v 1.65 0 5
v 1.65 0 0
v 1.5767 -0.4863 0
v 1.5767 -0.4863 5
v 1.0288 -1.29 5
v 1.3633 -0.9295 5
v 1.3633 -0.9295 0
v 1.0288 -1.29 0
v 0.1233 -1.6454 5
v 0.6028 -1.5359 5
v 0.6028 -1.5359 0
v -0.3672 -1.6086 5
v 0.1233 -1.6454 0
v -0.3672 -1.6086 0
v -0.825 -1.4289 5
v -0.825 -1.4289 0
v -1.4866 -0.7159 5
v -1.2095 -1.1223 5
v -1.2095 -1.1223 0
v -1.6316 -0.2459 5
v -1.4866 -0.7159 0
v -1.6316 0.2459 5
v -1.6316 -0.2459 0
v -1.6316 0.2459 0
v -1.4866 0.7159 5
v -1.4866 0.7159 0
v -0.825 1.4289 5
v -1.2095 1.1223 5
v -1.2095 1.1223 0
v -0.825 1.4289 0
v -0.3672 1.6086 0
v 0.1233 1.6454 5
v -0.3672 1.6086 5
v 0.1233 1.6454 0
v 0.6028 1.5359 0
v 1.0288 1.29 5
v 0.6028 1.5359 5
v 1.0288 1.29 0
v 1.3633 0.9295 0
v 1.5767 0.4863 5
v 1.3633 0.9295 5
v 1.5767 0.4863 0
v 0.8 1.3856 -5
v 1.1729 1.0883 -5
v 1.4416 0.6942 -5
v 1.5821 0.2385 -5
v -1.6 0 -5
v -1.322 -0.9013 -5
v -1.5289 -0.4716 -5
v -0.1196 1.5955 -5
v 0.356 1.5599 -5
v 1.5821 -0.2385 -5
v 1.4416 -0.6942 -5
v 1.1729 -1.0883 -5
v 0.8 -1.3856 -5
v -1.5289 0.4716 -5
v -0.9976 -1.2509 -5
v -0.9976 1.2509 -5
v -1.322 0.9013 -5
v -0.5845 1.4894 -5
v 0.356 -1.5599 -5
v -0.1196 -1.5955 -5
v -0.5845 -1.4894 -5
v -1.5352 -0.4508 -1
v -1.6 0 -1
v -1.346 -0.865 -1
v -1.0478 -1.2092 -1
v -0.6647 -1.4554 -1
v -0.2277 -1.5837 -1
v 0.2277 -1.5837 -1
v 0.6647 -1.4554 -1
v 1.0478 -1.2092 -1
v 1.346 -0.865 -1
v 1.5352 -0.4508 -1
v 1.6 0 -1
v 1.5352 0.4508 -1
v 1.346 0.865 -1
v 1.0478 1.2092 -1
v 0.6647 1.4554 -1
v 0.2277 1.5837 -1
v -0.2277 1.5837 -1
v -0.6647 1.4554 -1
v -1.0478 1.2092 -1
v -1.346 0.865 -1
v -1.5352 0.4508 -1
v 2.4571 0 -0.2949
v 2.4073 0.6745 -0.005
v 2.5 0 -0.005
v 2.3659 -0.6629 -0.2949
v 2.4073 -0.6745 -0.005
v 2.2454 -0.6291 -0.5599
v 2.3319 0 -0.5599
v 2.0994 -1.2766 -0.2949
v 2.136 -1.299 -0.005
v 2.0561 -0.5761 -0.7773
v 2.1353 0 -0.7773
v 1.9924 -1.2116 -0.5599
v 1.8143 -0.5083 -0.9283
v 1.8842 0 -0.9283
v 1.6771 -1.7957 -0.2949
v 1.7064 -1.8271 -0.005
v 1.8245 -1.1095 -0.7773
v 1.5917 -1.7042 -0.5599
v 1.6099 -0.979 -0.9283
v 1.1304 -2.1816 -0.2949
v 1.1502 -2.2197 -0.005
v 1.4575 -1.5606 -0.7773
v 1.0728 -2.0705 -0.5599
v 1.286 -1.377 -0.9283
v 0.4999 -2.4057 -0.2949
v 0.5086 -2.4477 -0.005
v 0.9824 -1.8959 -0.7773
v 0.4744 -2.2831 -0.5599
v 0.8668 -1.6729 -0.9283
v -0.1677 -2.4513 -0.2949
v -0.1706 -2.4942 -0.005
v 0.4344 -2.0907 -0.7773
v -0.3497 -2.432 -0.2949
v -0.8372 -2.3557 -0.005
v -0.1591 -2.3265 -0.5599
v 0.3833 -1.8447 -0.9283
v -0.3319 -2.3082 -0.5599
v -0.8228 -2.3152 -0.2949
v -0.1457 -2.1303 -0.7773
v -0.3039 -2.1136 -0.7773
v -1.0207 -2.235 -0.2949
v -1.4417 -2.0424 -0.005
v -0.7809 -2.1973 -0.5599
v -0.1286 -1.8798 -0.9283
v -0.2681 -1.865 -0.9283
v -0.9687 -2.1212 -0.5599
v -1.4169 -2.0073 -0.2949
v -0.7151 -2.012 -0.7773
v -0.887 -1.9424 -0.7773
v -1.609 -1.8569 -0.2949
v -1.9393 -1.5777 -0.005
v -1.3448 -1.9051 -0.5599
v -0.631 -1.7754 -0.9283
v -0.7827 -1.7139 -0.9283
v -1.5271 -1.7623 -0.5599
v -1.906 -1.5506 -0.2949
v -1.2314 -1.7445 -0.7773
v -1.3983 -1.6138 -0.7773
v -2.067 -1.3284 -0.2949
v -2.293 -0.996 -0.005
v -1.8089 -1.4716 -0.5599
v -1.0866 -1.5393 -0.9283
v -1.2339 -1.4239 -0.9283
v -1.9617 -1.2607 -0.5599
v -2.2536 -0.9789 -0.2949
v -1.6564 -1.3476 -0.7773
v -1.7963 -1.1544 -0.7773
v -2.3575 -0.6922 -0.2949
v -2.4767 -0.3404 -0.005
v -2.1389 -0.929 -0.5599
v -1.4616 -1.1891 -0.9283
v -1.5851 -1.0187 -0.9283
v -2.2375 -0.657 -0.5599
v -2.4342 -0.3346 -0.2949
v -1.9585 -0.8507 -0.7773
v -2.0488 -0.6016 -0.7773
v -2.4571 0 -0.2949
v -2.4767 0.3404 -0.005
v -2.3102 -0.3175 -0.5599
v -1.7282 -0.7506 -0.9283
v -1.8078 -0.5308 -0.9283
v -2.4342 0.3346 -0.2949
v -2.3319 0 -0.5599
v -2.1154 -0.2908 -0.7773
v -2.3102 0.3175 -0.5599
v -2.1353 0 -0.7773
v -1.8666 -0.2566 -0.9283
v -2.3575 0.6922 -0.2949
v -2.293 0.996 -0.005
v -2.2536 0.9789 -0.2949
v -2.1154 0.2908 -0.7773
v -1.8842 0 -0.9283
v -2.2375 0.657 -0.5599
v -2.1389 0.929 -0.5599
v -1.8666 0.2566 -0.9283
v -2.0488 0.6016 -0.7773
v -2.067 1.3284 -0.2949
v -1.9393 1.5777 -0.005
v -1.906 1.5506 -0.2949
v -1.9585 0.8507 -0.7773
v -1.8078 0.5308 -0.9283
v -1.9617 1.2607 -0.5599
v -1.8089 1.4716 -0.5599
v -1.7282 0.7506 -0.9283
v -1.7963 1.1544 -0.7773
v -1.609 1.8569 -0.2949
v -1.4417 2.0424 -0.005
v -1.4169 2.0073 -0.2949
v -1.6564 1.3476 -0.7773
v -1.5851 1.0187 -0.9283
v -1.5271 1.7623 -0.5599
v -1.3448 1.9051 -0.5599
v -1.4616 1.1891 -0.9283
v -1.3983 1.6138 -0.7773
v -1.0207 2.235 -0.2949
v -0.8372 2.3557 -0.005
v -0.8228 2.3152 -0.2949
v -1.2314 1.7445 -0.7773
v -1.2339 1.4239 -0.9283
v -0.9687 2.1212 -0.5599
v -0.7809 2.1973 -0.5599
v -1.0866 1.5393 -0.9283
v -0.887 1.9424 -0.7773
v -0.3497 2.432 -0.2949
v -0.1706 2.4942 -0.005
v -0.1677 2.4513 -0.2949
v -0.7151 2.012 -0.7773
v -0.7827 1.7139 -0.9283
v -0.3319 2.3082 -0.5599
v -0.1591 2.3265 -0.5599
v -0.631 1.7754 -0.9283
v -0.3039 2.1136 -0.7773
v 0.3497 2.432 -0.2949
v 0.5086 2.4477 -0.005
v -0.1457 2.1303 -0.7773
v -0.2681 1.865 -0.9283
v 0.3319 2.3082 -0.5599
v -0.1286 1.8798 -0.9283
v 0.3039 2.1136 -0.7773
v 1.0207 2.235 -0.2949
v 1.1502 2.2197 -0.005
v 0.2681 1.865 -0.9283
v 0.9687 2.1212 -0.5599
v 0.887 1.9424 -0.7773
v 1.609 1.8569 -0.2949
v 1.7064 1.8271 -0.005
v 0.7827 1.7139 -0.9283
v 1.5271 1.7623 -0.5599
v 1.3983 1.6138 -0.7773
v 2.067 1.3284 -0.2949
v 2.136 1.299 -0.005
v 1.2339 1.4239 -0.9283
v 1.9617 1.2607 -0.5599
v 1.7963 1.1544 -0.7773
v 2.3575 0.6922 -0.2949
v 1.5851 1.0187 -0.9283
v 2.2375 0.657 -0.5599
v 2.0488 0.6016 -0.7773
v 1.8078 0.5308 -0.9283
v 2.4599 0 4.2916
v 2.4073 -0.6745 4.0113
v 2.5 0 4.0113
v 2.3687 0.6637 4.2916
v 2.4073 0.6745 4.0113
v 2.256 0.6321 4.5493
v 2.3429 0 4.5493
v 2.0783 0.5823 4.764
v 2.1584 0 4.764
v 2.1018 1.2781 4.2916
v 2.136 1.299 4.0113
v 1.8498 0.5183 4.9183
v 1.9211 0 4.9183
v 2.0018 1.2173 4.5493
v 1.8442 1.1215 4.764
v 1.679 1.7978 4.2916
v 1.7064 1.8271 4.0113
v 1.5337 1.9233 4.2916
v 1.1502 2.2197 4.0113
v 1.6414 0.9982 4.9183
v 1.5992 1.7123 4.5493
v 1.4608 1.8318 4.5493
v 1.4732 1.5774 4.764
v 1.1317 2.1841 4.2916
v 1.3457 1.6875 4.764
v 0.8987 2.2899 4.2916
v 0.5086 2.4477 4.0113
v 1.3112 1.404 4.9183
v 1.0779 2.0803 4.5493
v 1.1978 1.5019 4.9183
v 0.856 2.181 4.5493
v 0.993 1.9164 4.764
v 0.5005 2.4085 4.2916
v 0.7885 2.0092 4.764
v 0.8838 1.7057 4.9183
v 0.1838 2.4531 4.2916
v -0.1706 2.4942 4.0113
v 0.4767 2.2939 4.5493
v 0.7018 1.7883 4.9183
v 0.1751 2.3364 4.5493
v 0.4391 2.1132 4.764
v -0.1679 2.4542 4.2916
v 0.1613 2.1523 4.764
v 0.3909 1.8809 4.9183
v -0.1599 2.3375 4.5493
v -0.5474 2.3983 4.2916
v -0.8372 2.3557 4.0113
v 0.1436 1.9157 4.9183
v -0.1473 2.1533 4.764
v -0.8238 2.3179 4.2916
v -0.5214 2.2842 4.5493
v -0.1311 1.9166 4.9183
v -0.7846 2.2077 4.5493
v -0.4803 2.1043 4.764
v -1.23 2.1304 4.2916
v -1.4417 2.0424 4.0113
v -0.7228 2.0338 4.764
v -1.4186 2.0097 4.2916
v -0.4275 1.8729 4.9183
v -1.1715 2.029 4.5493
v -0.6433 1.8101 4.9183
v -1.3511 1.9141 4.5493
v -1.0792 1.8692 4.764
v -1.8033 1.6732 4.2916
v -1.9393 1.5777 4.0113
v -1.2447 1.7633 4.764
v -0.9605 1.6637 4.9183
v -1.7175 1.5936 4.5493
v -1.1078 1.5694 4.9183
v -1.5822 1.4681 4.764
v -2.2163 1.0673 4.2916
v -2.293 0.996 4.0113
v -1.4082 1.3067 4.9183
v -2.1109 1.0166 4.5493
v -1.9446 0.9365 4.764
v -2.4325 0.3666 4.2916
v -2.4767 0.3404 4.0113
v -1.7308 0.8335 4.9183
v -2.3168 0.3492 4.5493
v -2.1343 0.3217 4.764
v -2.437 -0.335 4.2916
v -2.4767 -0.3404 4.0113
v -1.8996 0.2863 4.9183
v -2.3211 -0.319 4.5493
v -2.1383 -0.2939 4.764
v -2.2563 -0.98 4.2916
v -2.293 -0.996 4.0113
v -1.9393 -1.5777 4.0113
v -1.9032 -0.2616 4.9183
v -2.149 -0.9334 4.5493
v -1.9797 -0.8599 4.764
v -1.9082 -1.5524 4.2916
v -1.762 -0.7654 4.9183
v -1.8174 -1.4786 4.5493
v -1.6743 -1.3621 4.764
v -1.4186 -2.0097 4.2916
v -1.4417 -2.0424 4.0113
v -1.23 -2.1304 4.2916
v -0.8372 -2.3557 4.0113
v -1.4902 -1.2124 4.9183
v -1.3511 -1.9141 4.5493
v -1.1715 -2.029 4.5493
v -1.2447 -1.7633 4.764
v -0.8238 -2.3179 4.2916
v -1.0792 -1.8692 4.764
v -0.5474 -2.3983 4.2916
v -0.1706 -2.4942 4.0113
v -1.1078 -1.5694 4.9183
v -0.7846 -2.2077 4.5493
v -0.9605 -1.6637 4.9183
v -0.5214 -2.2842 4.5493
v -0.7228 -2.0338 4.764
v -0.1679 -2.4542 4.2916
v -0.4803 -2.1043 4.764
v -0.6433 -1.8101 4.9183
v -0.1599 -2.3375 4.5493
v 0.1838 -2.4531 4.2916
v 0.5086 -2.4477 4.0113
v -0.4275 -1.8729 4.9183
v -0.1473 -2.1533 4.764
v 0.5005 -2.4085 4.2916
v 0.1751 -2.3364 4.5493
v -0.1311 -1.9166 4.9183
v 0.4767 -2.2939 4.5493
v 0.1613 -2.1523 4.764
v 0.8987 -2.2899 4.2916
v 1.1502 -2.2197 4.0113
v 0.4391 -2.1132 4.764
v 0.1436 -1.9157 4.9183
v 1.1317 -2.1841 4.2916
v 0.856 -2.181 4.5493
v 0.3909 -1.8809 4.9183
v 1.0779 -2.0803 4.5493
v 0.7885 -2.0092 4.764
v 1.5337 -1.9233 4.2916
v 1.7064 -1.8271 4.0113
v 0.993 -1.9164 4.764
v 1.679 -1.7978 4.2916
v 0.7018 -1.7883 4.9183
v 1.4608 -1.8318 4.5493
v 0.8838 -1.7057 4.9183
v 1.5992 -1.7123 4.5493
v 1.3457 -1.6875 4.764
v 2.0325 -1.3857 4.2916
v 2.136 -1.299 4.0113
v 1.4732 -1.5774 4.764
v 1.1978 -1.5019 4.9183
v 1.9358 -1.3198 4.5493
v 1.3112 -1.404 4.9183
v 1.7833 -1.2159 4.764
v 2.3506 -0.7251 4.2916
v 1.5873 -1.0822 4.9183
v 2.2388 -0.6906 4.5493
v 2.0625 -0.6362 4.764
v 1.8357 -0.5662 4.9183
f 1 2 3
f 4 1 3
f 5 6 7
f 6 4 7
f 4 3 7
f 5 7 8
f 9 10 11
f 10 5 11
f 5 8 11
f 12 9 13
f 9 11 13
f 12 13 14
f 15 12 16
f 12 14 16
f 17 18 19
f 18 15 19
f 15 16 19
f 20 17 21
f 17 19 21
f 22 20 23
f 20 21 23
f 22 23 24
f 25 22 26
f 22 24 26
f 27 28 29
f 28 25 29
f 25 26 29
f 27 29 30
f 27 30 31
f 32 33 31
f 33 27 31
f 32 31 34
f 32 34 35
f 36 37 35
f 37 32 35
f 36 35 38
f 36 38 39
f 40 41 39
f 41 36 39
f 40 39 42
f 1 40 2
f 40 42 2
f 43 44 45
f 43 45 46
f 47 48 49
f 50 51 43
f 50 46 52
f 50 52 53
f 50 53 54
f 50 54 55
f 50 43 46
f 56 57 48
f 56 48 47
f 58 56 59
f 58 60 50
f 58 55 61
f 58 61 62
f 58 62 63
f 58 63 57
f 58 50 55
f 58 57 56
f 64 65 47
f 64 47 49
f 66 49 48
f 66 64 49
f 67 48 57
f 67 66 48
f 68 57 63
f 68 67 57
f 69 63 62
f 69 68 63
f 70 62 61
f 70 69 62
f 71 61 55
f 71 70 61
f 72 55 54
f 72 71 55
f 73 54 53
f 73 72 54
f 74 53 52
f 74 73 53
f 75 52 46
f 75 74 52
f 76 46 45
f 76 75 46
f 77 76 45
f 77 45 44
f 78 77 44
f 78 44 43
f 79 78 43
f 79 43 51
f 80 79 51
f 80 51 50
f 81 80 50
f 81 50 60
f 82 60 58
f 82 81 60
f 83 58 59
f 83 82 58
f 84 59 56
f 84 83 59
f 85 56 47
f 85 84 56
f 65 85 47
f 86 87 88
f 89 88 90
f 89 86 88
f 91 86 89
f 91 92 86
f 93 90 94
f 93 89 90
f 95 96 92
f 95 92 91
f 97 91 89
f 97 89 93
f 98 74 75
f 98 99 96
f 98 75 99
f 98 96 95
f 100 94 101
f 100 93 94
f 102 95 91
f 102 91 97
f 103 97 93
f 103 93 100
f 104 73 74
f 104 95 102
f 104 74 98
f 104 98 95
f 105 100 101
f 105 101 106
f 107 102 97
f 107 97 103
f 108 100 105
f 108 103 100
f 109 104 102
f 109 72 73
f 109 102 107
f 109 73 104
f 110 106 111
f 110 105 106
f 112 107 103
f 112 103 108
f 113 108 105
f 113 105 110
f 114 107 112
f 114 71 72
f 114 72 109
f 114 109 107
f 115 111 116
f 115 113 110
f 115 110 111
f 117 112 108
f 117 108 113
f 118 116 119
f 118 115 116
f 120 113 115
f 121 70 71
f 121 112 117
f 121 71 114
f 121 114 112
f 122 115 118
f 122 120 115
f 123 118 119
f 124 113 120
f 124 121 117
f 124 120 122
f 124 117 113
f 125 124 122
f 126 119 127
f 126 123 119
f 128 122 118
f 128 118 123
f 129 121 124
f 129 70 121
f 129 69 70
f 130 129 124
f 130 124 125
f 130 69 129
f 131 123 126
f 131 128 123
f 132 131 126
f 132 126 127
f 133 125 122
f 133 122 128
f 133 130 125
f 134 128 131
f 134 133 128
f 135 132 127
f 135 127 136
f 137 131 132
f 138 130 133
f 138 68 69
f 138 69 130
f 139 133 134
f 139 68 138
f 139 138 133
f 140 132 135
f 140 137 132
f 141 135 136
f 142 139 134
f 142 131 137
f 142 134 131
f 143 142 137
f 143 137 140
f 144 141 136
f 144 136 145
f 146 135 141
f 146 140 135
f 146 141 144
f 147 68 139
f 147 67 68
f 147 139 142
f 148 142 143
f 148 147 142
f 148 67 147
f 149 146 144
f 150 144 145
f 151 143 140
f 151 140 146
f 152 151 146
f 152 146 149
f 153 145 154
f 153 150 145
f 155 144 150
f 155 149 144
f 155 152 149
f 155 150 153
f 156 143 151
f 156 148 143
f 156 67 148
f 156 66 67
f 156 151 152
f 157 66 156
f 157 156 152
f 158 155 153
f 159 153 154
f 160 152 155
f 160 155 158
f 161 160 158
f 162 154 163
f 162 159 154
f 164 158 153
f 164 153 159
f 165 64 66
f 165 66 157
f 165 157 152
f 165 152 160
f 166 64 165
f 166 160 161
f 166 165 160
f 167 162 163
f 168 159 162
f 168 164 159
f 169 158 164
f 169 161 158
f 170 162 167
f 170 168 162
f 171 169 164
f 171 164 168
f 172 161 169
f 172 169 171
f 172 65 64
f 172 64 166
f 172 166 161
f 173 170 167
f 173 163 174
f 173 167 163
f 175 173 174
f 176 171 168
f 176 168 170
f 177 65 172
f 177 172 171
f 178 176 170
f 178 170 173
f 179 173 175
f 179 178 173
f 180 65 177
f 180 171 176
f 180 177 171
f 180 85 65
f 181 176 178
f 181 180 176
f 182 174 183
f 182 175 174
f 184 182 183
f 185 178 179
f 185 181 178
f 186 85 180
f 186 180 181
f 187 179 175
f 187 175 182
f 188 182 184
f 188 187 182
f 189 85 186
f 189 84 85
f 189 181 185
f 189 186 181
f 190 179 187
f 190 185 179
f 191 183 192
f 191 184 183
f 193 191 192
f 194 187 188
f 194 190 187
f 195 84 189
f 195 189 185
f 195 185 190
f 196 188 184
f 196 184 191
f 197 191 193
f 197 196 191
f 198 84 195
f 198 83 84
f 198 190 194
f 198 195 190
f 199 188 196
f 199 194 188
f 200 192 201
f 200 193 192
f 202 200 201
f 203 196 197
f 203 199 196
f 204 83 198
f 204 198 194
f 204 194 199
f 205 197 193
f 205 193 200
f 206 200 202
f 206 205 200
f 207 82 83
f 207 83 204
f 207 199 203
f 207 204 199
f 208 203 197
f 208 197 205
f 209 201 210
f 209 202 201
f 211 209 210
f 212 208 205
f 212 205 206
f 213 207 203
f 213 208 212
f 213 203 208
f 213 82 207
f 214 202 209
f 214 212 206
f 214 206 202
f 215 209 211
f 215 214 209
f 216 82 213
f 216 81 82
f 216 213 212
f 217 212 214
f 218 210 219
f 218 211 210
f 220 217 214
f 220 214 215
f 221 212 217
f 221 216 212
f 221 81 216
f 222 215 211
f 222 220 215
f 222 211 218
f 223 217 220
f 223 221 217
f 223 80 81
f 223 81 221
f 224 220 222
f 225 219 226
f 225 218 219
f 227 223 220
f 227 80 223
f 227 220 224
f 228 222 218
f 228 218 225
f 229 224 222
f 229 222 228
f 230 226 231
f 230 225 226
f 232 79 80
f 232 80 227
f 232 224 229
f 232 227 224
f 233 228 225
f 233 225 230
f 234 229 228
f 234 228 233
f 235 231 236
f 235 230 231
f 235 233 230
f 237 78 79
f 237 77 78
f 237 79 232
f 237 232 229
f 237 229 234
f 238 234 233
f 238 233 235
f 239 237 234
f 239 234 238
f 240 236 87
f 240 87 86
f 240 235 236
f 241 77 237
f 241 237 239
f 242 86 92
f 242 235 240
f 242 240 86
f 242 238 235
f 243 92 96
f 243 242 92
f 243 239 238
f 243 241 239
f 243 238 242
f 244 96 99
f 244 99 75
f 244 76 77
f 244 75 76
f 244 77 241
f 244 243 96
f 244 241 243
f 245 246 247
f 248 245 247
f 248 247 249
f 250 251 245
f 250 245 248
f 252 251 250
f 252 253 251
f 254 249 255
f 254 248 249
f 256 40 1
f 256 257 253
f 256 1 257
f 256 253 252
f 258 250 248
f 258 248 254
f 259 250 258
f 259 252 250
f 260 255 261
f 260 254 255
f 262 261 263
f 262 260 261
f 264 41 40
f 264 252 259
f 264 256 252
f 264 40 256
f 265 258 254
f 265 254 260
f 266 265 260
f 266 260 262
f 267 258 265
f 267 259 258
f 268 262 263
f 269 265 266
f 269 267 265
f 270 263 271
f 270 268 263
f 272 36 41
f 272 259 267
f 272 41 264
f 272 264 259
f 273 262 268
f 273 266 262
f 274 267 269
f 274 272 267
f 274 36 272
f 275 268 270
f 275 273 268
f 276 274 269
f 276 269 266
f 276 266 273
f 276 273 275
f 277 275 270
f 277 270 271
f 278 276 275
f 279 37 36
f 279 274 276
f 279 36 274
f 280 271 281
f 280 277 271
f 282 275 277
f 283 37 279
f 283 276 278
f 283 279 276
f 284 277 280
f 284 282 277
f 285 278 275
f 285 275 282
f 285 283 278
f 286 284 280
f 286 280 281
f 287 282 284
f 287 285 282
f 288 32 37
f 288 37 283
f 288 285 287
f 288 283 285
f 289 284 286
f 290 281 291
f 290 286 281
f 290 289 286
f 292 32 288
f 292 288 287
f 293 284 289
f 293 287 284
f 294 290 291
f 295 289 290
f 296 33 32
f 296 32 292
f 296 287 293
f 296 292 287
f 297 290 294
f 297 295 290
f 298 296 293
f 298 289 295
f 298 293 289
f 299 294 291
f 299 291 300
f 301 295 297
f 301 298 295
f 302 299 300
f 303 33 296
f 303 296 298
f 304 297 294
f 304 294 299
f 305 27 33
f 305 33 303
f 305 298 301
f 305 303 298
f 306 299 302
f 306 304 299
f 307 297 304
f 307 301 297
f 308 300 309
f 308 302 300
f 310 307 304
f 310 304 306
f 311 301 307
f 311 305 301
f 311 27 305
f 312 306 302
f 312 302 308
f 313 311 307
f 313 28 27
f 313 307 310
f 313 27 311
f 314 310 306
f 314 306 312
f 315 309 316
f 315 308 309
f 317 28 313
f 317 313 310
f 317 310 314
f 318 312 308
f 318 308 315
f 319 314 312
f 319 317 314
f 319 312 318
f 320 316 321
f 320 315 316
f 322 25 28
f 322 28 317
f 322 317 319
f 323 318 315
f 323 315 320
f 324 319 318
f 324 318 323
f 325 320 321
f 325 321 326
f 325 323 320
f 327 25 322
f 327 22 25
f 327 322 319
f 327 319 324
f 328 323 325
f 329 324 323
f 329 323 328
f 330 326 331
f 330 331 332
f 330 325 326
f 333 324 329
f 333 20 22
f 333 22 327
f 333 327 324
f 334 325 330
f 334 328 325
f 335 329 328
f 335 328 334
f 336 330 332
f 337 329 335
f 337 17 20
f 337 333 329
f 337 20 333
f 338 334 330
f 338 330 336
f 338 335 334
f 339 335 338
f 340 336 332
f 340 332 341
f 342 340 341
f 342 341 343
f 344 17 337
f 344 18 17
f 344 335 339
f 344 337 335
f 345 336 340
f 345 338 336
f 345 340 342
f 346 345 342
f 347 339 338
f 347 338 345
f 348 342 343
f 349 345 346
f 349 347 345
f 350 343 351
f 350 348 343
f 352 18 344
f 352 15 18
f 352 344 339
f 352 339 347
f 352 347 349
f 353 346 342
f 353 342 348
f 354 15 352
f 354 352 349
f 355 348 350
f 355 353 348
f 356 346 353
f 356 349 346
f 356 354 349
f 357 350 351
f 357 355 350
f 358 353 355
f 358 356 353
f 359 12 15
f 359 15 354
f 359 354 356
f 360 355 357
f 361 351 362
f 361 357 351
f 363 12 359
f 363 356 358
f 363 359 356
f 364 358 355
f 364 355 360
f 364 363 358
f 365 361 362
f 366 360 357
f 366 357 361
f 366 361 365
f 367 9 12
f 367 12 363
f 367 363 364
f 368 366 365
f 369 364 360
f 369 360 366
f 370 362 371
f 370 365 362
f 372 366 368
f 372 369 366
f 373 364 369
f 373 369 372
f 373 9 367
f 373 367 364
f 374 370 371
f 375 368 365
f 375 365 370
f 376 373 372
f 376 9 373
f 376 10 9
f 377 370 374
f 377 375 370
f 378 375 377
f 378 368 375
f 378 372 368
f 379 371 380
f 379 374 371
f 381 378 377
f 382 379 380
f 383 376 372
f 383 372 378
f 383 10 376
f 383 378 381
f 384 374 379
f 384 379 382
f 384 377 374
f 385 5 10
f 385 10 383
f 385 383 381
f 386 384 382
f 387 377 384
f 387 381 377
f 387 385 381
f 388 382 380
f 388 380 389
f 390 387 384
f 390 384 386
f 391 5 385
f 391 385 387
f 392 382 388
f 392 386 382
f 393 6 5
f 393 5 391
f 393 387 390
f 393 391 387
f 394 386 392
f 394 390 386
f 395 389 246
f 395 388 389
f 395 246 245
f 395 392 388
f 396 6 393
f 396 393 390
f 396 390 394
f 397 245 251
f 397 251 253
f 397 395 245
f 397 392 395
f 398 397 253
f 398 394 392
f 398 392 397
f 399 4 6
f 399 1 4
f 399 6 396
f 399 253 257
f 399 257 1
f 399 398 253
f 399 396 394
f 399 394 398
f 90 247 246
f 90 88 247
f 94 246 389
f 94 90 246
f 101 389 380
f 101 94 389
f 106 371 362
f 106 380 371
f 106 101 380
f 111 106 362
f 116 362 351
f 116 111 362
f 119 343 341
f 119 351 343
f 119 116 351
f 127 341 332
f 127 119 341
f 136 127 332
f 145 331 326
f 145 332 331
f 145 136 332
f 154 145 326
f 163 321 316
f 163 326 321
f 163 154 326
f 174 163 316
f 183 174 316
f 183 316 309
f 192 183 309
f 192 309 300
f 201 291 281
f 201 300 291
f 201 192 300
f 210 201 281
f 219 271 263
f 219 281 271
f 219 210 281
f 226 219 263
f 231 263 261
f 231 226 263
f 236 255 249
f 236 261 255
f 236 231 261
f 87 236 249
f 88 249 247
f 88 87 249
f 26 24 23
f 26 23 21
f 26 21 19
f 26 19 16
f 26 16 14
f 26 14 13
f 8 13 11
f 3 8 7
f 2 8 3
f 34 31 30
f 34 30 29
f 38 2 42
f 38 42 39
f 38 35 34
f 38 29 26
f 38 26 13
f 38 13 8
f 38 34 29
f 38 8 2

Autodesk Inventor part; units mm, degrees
ref_plane "YZ Plane" through (0, 0, 0) normal (1, 0, 0) x (0, 1, 0)
ref_plane "XZ Plane" through (0, 0, 0) normal (0, 1, 0) x (-1, 0, 0)
ref_plane "XY Plane" through (0, 0, 0) normal (0, 0, 1) x (1, 0, 0)
sketch "Sketch1" plane through (0, 0, 0) normal (0, 0, 1) x (1, 0, 0)
  circle A0 centre (0, 0) radius 1.65
  circle A1 centre (0, 0) radius 2.5
  dimension "d0" = 3.3
  dimension "d1" = 5
extrude "Extrusion1" add sketch "Sketch1" along normal blind 5
sketch "Sketch2" plane through (0, 0, 0) normal (0, 0, 1) x (1, 0, 0)
  circle A0 centre (0, 0) radius 2.5 projected
extrude "Extrusion2" add sketch "Sketch2" against normal blind 1
sketch "Sketch3" plane through (0, 0, -1) normal (0, 0, -1) x (-1, 0, 0)
  circle A0 centre (0, 0) radius 1.6
  dimension "d6" = 3.2
extrude "Extrusion3" add sketch "Sketch3" along normal blind 4
fillet "Fillet1" radius 1 2 edges at (-2.5, 0, -1) (-2.5, 0, 5)
properties part number "Hat"
